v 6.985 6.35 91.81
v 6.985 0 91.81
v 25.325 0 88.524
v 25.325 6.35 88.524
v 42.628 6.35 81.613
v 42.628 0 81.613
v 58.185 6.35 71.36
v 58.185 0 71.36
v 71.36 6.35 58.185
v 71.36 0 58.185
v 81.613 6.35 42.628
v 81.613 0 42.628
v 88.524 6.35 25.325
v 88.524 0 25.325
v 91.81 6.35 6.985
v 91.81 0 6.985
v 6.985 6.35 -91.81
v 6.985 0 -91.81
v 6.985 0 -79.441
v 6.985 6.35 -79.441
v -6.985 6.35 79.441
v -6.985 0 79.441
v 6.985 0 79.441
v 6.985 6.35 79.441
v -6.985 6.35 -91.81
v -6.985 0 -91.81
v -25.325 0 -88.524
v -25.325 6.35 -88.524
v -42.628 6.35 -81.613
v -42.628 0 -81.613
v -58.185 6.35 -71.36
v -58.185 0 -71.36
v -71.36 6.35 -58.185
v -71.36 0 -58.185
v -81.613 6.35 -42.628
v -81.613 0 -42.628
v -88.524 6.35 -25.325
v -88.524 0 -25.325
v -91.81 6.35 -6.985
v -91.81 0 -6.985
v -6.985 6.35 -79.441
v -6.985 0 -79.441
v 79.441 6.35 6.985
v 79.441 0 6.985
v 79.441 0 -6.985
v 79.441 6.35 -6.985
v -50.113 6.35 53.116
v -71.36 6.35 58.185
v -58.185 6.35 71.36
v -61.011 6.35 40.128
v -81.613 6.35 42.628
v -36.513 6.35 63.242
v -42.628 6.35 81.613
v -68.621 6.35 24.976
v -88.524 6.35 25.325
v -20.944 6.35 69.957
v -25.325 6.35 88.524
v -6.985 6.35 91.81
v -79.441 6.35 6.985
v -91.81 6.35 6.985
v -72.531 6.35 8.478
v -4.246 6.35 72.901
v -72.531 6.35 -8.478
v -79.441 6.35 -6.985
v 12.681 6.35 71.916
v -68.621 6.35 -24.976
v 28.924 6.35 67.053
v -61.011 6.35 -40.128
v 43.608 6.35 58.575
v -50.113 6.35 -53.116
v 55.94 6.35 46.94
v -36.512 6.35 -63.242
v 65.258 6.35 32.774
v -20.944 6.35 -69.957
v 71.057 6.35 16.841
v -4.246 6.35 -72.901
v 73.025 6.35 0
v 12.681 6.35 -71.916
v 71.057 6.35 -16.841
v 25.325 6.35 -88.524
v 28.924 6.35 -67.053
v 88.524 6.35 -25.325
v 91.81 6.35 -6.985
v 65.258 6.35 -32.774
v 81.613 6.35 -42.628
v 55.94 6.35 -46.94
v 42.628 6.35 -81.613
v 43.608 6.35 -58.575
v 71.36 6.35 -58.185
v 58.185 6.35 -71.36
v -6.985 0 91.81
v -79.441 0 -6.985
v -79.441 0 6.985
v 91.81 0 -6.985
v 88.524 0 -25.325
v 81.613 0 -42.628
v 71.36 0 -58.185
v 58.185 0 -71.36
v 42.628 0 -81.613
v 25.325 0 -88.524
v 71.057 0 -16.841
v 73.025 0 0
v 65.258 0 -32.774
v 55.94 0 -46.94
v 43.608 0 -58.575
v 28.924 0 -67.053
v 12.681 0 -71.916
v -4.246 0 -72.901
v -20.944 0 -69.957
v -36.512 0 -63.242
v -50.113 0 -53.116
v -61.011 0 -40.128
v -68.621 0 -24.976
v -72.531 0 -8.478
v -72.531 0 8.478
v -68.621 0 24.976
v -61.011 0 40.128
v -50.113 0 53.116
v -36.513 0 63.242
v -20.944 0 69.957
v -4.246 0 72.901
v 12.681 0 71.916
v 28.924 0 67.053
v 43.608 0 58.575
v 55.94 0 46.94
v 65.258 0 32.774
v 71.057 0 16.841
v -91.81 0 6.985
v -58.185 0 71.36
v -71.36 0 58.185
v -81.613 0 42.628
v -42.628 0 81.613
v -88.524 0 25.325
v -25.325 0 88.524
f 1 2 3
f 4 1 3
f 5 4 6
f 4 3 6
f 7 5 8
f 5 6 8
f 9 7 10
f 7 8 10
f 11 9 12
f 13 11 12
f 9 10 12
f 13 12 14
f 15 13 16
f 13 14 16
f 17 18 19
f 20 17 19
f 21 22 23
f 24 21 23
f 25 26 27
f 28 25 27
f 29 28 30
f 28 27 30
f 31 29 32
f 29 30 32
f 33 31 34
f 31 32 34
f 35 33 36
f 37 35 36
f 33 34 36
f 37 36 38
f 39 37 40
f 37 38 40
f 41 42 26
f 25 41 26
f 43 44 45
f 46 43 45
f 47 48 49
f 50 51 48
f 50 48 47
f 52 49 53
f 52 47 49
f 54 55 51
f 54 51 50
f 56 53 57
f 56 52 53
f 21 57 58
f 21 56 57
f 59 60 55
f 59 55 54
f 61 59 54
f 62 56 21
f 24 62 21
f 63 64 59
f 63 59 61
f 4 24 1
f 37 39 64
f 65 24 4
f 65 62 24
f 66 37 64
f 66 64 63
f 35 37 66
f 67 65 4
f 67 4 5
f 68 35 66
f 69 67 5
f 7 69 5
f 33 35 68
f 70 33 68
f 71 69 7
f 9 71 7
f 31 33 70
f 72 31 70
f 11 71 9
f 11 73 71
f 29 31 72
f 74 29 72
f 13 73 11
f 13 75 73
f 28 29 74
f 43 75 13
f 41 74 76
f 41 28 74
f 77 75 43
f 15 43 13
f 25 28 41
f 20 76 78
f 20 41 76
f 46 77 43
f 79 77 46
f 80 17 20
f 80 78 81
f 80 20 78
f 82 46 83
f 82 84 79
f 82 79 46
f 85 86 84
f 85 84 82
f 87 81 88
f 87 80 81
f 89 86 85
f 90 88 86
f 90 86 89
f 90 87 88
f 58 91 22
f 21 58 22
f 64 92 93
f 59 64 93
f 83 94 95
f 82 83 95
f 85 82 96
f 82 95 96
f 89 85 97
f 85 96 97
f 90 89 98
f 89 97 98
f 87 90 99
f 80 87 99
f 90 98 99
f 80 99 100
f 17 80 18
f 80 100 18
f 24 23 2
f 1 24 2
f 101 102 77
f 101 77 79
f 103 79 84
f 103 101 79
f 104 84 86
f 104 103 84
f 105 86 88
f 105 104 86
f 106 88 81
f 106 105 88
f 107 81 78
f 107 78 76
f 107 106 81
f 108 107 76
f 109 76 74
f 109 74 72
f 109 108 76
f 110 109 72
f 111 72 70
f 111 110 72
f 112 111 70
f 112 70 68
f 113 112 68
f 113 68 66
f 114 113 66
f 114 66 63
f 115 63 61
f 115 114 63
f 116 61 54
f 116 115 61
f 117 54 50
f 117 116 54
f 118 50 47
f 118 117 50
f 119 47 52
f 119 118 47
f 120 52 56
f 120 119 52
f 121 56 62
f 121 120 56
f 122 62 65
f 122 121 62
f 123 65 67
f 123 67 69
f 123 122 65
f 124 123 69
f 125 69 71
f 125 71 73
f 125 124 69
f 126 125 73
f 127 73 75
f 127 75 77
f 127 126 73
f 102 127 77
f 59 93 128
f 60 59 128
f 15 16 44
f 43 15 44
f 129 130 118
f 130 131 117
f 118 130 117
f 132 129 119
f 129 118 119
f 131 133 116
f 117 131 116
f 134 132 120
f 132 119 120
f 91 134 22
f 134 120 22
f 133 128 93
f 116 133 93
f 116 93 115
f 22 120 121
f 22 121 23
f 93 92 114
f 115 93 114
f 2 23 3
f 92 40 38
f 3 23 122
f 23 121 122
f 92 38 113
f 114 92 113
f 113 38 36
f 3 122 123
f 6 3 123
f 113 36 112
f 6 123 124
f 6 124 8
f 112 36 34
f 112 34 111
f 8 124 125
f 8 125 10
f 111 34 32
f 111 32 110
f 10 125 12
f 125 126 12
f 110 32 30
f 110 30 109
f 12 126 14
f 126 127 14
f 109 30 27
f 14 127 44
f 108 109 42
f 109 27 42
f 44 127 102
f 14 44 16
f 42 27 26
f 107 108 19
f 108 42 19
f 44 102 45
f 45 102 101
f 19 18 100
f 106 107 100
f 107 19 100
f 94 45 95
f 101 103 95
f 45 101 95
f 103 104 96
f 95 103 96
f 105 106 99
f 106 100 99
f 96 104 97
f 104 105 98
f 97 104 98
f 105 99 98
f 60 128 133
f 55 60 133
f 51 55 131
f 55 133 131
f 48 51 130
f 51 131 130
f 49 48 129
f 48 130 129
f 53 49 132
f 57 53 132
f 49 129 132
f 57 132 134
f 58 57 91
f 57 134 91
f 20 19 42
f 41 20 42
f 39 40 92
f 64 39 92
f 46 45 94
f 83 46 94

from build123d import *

# Parameters (mm, degrees)
SKETCH1_R           = 73.025
BOSS_EXTRUDE1_DEPTH = 6.35


with BuildPart() as part:
    # Sketch1 → Boss-Extrude1 (new body)
    with BuildSketch(Plane(origin=(0, 0, 0), x_dir=(1, 0, 0), z_dir=(0, 1, 0))):
        with BuildLine():
            Line((79.44104, 6.985), (91.809669425, 6.985))
            ThreePointArc((91.809669425, 6.985), (65.106856878, 65.106856878), (6.985, 91.809669425))
            Line((6.985, 91.809669425), (6.985, 79.44104))
            Line((6.985, 79.44104), (-6.985, 79.44104))
            Line((-6.985, 79.44104), (-6.985, 91.809669425))
            ThreePointArc((-6.985, 91.809669425), (-65.106856878, 65.106856878), (-91.809669425, 6.985))
            Line((-91.809669425, 6.985), (-79.44104, 6.985))
            Line((-79.44104, 6.985), (-79.44104, -6.985))
            Line((-79.44104, -6.985), (-91.809669425, -6.985))
            ThreePointArc((-91.809669425, -6.985), (-65.106856878, -65.106856878), (-6.985, -91.809669425))
            Line((-6.985, -91.809669425), (-6.985, -79.44104))
            Line((-6.985, -79.44104), (6.985, -79.44104))
            Line((6.985, -79.44104), (6.985, -91.809669425))
            ThreePointArc((6.985, -91.809669425), (65.106856878, -65.106856878), (91.809669425, -6.985))
            Line((91.809669425, -6.985), (79.44104, -6.985))
            Line((79.44104, -6.985), (79.44104, 6.985))
        make_face()
        Circle(SKETCH1_R, mode=Mode.SUBTRACT)
    extrude(amount=BOSS_EXTRUDE1_DEPTH)


solid = part.part
